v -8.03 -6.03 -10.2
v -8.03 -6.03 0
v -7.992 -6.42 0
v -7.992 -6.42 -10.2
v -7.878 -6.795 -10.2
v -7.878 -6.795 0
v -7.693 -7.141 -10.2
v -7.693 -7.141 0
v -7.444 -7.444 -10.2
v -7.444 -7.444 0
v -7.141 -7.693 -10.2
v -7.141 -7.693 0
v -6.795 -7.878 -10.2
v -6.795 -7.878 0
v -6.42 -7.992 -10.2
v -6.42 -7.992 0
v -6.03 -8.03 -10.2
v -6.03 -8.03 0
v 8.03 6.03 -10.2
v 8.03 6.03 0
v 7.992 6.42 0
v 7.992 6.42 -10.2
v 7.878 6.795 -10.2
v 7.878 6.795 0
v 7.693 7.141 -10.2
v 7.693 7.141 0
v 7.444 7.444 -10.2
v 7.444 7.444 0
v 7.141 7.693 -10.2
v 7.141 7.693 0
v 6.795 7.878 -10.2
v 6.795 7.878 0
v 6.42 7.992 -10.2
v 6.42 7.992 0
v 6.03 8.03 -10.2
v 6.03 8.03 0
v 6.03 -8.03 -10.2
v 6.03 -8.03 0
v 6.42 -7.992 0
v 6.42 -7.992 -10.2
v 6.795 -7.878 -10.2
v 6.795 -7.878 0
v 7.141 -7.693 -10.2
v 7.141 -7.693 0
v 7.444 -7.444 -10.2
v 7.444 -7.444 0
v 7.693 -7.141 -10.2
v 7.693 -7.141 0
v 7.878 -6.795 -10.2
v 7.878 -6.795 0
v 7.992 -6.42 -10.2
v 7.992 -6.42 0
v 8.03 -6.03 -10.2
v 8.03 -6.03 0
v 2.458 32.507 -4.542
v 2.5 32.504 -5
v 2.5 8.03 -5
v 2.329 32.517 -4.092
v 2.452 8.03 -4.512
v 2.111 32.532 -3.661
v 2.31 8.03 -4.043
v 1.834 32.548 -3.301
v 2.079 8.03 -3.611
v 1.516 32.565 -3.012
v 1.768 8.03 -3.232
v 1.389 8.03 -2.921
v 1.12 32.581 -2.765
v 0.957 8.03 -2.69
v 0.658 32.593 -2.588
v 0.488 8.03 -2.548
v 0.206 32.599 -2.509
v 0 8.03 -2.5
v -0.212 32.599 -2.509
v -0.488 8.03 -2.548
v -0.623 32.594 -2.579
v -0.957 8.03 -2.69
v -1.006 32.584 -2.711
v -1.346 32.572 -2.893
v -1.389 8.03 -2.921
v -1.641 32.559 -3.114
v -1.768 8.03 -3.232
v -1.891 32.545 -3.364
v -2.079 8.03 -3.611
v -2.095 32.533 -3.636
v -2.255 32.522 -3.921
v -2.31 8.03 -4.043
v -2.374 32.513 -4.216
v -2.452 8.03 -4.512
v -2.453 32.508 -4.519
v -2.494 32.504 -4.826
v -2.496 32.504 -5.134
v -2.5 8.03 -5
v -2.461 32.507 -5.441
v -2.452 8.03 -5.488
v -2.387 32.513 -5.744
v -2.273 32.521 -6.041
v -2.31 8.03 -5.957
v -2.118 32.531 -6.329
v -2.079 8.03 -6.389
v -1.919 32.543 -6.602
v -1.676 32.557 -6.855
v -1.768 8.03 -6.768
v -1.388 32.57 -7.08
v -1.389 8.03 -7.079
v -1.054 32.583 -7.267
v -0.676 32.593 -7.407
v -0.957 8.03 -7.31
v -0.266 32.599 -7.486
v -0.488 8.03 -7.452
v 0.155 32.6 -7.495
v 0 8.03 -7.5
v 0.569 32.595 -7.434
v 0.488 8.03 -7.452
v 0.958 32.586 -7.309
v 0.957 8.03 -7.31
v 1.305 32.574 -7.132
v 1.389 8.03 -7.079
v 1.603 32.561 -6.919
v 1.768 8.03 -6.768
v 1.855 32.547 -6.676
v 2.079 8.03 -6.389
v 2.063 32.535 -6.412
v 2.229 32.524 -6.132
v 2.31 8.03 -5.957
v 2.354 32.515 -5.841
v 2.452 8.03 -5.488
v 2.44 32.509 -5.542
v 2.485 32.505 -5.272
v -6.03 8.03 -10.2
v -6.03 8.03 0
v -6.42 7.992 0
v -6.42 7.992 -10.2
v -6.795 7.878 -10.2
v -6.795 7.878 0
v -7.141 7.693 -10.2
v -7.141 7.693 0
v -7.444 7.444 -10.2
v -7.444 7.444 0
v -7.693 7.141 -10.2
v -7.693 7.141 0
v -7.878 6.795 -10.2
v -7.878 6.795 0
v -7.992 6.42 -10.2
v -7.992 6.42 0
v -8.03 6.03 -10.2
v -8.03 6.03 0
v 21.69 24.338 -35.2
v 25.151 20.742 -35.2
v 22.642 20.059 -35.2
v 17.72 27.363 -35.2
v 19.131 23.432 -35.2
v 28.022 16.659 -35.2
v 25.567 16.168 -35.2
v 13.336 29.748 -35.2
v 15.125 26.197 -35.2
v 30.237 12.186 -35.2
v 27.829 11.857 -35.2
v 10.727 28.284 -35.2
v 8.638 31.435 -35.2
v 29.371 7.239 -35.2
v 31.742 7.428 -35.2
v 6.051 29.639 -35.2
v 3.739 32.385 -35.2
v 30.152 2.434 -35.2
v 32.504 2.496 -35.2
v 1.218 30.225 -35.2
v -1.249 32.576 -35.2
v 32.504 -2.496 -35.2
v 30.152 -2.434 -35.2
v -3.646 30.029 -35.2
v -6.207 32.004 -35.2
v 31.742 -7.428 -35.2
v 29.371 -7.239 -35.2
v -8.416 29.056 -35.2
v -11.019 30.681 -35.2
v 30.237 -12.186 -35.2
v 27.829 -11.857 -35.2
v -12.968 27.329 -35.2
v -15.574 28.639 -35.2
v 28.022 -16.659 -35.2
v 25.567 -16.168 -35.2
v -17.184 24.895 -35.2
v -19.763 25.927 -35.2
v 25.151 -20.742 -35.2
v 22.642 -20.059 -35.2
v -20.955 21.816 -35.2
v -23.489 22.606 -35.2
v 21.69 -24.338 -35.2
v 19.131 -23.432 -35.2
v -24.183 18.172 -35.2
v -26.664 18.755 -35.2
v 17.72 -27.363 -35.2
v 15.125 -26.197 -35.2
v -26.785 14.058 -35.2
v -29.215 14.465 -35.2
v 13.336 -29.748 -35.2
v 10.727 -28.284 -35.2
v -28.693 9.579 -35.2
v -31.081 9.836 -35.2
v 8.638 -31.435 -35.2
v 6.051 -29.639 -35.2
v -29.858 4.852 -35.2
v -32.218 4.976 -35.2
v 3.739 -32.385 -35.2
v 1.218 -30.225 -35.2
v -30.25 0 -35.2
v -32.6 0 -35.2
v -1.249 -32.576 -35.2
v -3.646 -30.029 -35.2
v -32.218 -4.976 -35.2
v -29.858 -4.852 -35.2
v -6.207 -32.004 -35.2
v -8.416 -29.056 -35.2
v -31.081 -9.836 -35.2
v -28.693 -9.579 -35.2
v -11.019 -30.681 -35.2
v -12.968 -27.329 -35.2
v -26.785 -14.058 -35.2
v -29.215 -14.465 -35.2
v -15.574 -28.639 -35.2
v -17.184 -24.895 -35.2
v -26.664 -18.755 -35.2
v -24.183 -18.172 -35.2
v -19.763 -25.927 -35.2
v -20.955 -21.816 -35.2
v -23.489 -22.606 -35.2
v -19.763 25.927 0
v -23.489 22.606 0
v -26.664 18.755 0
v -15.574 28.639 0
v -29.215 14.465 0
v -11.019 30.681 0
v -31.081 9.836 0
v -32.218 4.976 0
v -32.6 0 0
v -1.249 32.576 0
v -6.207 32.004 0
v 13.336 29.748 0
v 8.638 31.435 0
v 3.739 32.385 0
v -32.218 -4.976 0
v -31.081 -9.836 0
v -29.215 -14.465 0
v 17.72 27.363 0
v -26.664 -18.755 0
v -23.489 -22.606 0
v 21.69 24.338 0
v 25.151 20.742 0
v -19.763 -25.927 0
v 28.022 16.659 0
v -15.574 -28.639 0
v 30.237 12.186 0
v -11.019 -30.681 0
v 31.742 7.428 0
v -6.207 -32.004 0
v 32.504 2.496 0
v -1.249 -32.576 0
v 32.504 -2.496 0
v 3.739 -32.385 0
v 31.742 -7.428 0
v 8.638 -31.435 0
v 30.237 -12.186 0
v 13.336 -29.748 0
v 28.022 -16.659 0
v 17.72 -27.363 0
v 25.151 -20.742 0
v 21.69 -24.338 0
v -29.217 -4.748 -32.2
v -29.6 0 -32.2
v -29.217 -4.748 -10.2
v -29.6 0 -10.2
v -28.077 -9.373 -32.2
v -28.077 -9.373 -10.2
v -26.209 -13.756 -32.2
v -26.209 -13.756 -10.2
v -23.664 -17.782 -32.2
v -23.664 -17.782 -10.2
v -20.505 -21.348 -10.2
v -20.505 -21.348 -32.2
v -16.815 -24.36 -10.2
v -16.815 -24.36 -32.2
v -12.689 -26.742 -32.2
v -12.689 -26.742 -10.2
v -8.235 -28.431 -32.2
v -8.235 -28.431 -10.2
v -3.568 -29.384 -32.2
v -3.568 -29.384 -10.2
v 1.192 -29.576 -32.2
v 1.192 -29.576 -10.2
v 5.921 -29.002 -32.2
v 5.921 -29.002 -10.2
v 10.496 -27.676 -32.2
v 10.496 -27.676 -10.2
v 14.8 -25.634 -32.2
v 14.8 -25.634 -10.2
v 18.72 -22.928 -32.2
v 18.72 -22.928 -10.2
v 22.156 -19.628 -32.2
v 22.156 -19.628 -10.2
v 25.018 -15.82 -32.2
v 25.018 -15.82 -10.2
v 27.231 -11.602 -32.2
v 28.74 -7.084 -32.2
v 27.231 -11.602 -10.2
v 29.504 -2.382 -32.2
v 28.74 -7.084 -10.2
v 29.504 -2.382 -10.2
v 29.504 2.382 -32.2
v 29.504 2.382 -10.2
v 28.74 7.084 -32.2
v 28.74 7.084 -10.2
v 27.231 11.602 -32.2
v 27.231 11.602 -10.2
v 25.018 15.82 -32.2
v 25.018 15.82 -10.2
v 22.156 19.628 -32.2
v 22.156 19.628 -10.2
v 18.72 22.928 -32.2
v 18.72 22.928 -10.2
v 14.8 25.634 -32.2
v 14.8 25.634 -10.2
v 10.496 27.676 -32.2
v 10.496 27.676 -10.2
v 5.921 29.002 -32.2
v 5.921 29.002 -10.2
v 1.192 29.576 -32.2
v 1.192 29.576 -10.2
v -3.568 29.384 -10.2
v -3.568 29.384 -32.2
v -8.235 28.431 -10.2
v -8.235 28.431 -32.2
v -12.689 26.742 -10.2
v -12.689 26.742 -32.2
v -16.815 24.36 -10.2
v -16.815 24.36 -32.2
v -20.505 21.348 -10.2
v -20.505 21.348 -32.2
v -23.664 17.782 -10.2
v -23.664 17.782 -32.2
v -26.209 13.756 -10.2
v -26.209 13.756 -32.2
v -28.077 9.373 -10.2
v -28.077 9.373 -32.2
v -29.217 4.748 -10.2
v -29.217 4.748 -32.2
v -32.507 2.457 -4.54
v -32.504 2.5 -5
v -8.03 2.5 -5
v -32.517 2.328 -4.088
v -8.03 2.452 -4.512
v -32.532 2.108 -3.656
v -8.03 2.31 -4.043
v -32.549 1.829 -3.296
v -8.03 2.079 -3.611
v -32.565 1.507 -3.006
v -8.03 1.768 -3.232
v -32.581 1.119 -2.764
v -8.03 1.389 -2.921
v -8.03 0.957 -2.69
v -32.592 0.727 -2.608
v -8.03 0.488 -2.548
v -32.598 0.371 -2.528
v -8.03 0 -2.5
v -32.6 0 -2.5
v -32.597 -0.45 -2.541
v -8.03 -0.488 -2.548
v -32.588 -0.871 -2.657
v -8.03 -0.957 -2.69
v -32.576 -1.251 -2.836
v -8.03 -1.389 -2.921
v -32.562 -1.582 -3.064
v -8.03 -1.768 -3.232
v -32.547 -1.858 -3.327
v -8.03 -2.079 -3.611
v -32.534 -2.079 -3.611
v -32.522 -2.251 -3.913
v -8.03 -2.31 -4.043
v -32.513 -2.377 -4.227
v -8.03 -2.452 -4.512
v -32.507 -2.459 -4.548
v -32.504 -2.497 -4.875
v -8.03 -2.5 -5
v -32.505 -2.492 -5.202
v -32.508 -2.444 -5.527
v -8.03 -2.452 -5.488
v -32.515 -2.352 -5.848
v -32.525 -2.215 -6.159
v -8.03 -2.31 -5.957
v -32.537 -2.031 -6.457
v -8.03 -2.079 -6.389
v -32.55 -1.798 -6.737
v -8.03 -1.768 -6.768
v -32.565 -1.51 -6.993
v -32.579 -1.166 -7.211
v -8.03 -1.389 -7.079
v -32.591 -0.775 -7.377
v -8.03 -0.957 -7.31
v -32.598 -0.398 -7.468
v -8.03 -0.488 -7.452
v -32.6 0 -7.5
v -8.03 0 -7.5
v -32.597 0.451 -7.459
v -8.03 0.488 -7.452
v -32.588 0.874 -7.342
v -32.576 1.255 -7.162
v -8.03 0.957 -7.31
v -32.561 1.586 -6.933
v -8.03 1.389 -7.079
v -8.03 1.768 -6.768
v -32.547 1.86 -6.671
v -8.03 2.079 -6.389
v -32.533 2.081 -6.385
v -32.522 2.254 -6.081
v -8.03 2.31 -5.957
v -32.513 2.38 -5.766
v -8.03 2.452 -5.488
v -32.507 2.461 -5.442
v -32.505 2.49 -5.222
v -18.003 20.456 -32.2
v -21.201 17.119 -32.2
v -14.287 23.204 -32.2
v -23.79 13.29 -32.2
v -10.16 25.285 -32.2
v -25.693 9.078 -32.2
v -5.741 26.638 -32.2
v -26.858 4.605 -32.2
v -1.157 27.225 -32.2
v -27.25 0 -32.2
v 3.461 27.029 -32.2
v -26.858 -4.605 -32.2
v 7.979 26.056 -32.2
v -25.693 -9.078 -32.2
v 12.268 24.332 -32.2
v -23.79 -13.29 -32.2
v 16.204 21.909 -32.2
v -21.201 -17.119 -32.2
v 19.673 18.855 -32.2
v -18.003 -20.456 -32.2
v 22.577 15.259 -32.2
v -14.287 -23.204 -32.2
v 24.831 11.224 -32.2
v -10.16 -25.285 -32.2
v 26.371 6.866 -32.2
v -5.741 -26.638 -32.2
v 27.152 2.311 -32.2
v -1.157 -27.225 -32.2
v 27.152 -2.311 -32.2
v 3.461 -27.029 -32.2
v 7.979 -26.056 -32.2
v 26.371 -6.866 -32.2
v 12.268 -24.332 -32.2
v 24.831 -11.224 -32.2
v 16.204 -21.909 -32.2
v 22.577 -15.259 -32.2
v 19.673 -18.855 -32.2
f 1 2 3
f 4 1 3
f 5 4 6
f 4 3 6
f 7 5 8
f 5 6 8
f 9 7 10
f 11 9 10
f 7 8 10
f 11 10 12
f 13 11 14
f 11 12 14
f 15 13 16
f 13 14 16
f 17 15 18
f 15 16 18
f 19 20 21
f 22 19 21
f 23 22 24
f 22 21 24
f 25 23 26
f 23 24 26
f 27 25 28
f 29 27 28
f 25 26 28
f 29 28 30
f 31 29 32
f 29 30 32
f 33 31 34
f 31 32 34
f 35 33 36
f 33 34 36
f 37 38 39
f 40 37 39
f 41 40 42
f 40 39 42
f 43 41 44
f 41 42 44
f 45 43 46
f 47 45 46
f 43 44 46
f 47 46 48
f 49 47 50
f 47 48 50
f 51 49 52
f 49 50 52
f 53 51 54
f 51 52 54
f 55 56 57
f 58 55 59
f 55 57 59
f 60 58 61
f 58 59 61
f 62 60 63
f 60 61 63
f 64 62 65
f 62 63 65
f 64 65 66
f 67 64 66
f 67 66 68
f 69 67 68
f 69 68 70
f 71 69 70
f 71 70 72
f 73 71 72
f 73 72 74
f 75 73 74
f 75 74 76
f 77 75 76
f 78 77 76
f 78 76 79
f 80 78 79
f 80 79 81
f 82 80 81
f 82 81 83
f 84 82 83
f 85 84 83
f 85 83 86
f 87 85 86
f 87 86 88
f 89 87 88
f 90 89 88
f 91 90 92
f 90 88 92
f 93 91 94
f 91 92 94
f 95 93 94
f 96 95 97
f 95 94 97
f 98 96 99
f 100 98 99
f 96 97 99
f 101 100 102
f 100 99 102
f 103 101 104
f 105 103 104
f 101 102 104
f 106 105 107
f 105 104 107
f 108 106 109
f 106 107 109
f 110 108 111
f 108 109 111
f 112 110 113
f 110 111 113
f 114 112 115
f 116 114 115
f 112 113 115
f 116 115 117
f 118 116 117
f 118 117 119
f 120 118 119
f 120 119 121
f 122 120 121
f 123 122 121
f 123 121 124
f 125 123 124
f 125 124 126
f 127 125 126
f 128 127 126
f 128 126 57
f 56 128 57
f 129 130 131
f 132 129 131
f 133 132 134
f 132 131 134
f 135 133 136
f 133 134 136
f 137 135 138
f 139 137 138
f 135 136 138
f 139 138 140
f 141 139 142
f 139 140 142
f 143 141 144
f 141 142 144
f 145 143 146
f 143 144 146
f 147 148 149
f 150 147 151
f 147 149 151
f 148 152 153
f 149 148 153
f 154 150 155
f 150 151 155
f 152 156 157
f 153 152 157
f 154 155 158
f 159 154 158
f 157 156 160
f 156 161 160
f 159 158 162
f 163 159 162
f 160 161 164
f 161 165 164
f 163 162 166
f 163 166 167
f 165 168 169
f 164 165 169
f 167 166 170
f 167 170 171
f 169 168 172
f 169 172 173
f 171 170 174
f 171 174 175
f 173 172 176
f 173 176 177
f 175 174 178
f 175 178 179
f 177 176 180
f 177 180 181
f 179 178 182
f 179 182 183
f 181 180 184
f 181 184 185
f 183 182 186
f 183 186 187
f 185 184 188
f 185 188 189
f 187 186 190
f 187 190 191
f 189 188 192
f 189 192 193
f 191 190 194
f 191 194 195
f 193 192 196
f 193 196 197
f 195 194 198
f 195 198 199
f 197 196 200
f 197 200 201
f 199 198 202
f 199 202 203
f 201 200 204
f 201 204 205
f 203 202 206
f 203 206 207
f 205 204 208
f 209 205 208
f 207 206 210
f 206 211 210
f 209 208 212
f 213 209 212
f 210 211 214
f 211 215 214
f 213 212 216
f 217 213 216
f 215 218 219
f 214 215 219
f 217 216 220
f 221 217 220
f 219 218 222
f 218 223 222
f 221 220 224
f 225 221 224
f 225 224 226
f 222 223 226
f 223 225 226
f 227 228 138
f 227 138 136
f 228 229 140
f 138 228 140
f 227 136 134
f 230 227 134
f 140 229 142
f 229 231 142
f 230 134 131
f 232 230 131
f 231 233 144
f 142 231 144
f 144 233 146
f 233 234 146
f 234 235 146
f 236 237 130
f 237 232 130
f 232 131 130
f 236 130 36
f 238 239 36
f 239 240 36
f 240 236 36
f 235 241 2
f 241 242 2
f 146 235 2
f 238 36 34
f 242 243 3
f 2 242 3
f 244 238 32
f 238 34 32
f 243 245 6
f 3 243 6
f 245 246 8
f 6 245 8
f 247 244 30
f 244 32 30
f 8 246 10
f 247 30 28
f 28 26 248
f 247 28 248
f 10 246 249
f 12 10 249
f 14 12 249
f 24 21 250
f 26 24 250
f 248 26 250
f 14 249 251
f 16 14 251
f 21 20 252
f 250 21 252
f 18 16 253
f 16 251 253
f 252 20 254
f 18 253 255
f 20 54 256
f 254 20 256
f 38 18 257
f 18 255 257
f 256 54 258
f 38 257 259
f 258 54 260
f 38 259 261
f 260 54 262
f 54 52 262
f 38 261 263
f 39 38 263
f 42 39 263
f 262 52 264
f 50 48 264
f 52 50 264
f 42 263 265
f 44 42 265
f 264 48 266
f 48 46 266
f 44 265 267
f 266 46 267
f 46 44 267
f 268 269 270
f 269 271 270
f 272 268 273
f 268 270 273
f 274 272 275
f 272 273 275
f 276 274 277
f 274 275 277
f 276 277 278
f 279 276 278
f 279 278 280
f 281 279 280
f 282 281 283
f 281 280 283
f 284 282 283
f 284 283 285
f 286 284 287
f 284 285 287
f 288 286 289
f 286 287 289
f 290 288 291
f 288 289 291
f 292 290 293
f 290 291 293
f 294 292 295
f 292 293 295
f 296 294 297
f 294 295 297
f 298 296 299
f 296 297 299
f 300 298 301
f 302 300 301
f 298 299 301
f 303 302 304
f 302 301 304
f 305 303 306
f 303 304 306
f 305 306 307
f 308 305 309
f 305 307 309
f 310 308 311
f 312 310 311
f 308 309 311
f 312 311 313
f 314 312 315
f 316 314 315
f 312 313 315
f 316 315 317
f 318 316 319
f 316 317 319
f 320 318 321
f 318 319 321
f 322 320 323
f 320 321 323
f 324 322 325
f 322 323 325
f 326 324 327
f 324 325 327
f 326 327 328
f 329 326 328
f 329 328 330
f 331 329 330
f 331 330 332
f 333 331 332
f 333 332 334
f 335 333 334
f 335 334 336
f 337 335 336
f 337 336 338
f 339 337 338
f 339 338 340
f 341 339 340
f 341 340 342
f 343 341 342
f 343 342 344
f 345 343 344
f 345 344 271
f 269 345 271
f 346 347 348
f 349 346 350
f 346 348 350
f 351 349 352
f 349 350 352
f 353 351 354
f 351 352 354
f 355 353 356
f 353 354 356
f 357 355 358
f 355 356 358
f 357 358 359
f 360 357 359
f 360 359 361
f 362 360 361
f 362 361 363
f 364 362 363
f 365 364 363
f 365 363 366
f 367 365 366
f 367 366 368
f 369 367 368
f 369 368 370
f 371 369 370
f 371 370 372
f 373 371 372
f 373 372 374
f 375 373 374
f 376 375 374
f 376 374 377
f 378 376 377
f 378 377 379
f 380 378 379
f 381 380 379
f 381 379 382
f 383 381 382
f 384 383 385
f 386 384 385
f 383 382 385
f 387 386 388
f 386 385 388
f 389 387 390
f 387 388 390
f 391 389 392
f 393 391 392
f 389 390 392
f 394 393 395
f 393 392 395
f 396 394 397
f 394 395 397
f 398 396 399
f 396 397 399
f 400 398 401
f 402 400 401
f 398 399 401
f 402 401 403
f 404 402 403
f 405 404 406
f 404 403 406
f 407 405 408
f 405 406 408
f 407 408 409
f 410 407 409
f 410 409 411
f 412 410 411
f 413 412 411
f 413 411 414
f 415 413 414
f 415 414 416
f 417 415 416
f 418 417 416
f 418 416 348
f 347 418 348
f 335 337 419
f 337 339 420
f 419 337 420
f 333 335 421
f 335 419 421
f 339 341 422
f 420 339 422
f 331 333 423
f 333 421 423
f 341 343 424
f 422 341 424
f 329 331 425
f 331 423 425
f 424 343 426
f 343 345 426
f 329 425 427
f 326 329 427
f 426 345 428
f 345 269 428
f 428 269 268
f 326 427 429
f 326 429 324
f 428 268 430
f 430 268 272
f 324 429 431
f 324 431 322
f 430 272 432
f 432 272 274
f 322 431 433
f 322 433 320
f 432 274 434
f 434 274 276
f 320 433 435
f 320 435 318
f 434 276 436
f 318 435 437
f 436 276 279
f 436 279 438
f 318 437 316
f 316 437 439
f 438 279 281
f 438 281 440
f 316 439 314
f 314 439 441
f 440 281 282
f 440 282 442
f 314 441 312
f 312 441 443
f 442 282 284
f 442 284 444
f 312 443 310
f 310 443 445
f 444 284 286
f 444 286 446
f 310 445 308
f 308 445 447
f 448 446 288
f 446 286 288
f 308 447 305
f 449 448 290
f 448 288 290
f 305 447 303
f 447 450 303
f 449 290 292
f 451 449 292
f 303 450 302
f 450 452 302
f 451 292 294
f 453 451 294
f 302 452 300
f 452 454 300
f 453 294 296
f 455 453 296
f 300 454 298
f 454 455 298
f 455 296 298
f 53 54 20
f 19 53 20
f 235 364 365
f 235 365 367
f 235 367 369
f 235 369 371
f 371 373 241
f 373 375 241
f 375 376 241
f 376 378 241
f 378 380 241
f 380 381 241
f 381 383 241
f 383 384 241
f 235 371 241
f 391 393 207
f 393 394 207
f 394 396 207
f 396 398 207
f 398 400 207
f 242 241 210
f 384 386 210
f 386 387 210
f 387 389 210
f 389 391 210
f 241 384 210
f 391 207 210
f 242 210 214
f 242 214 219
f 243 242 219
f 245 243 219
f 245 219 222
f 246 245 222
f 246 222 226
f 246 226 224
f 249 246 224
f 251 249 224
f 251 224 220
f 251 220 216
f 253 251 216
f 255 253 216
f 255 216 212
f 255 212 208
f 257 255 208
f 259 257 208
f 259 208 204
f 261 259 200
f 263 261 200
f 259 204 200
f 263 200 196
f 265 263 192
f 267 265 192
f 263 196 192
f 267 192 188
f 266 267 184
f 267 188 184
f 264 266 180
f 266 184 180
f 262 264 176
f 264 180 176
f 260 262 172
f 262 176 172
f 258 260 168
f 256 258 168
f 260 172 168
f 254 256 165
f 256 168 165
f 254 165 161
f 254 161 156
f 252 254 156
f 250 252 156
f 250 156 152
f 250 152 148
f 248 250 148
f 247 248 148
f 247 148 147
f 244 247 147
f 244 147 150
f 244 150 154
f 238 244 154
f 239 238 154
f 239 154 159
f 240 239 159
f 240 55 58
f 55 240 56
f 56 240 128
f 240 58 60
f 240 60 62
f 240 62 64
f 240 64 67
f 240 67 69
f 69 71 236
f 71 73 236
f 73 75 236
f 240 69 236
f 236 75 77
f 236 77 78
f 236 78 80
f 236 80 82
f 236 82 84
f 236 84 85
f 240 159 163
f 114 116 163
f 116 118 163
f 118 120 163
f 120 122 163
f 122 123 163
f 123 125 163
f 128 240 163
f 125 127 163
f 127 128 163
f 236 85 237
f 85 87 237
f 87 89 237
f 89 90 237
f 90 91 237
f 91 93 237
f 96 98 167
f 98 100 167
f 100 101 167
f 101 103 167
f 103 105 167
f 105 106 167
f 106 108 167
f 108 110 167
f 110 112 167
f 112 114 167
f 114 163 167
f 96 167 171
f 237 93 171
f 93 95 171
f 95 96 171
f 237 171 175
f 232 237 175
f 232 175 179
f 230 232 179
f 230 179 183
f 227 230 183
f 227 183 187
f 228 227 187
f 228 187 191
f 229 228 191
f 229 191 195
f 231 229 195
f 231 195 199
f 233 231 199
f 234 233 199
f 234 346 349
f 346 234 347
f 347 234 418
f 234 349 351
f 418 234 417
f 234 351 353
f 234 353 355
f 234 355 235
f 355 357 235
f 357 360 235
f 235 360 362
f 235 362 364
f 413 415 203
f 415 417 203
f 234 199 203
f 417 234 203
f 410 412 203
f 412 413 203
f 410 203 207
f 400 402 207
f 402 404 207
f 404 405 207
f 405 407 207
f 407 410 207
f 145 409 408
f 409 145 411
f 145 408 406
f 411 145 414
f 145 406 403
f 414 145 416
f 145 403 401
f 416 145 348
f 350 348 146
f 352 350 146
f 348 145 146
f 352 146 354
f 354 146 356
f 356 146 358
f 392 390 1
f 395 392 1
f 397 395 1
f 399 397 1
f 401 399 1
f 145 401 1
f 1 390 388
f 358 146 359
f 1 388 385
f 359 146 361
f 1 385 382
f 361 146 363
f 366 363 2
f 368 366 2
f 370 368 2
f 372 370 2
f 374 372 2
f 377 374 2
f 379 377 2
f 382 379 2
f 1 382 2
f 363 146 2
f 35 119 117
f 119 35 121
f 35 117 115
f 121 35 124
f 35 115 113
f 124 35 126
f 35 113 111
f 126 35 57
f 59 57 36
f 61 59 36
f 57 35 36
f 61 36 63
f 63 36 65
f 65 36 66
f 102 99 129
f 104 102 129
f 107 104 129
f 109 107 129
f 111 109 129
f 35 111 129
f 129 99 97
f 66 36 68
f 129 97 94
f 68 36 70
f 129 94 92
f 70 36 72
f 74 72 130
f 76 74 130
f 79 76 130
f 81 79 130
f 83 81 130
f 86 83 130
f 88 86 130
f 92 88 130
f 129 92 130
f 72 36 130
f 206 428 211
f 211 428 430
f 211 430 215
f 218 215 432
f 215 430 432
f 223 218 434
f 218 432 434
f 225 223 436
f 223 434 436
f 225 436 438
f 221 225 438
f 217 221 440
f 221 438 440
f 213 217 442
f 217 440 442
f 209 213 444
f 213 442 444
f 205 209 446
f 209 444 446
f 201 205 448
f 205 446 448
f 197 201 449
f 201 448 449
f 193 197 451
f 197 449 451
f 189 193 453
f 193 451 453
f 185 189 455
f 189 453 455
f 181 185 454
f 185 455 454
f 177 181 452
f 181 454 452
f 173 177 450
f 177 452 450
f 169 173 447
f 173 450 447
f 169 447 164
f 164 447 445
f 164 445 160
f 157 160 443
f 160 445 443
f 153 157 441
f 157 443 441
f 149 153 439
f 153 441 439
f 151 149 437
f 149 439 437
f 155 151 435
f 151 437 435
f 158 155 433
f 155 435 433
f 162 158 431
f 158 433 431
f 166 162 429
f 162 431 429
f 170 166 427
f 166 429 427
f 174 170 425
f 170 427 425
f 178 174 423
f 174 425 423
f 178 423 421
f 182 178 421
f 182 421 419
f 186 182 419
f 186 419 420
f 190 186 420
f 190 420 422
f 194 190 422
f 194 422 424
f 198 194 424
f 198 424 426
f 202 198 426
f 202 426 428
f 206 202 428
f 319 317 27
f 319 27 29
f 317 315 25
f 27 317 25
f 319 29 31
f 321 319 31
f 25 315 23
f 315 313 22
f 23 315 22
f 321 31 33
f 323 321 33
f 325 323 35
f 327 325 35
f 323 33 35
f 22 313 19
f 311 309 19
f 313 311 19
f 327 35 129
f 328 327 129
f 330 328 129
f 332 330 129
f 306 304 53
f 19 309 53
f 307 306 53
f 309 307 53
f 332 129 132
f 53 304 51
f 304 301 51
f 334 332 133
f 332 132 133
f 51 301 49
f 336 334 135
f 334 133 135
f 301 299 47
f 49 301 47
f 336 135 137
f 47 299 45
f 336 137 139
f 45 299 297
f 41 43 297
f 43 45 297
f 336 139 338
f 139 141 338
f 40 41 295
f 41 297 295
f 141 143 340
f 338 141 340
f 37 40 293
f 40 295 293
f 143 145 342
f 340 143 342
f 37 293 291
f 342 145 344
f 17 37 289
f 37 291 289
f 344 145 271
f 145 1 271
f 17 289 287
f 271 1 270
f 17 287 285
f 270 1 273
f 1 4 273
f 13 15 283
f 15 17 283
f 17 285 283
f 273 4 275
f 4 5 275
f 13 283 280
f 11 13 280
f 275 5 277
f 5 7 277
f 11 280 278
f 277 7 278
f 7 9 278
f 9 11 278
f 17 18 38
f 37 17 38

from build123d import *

# Parameters (mm, degrees)
F3_DEPTH        = 25
F4_R            = 2.5
F5_DEPTH        = 24.571
F5_COPIES_COUNT = 2
F5_COPIES_ANGLE = 270


# Not quite as in the source:
# - a pattern or mirror of a feature is missing from the dataset's text; its kind, count and spacing are read off the source's solid


with BuildPart() as f1:
    # F0 (on Front) → F1 (revolve)
    with BuildSketch(Plane.XZ):
        Polygon((0, -10.2), (0, 0), (-32.6, 0), (-32.6, -35.2), (-30.25, -35.2), (-27.25, -32.2), (-29.6, -32.2), (-29.6, -10.2), align=None)
    revolve(axis=Axis((0, 0, -5.1), (0, 0, 1)))

    # F2 (on face) → F3 (cut)
    with BuildSketch(Plane.XY):
        with BuildLine():
            ThreePointArc((8.03, 6.03), (7.4442135624, 7.4442135624), (6.03, 8.03))
            Line((6.03, 8.03), (-6.03, 8.03))
            ThreePointArc((-6.03, 8.03), (-7.4442135624, 7.4442135624), (-8.03, 6.03))
            Line((-8.03, 6.03), (-8.03, -6.03))
            ThreePointArc((-8.03, -6.03), (-7.4442135624, -7.4442135624), (-6.03, -8.03))
            Line((-6.03, -8.03), (6.03, -8.03))
            ThreePointArc((6.03, -8.03), (7.4442135624, -7.4442135624), (8.03, -6.03))
            Line((8.03, -6.03), (8.03, 6.03))
        make_face()
    extrude(amount=-F3_DEPTH, mode=Mode.SUBTRACT)

    # F4 (on face) → F5 (cut, through all)
    with BuildSketch(Plane.YZ.offset(-8.03)):
        with Locations((0, -5)):
            Circle(F4_R)
    f5 = extrude(amount=-F5_DEPTH, mode=Mode.SUBTRACT)

    # F5_copies: F5 ×2 about axis
    f5_copies_axis = Axis((0, 0, 0), (0, 0, 1))
    for i in range(1, F5_COPIES_COUNT):
        add(f5.rotate(f5_copies_axis, i * F5_COPIES_ANGLE / (F5_COPIES_COUNT - 1)), mode=Mode.SUBTRACT)


solid = f1.part
